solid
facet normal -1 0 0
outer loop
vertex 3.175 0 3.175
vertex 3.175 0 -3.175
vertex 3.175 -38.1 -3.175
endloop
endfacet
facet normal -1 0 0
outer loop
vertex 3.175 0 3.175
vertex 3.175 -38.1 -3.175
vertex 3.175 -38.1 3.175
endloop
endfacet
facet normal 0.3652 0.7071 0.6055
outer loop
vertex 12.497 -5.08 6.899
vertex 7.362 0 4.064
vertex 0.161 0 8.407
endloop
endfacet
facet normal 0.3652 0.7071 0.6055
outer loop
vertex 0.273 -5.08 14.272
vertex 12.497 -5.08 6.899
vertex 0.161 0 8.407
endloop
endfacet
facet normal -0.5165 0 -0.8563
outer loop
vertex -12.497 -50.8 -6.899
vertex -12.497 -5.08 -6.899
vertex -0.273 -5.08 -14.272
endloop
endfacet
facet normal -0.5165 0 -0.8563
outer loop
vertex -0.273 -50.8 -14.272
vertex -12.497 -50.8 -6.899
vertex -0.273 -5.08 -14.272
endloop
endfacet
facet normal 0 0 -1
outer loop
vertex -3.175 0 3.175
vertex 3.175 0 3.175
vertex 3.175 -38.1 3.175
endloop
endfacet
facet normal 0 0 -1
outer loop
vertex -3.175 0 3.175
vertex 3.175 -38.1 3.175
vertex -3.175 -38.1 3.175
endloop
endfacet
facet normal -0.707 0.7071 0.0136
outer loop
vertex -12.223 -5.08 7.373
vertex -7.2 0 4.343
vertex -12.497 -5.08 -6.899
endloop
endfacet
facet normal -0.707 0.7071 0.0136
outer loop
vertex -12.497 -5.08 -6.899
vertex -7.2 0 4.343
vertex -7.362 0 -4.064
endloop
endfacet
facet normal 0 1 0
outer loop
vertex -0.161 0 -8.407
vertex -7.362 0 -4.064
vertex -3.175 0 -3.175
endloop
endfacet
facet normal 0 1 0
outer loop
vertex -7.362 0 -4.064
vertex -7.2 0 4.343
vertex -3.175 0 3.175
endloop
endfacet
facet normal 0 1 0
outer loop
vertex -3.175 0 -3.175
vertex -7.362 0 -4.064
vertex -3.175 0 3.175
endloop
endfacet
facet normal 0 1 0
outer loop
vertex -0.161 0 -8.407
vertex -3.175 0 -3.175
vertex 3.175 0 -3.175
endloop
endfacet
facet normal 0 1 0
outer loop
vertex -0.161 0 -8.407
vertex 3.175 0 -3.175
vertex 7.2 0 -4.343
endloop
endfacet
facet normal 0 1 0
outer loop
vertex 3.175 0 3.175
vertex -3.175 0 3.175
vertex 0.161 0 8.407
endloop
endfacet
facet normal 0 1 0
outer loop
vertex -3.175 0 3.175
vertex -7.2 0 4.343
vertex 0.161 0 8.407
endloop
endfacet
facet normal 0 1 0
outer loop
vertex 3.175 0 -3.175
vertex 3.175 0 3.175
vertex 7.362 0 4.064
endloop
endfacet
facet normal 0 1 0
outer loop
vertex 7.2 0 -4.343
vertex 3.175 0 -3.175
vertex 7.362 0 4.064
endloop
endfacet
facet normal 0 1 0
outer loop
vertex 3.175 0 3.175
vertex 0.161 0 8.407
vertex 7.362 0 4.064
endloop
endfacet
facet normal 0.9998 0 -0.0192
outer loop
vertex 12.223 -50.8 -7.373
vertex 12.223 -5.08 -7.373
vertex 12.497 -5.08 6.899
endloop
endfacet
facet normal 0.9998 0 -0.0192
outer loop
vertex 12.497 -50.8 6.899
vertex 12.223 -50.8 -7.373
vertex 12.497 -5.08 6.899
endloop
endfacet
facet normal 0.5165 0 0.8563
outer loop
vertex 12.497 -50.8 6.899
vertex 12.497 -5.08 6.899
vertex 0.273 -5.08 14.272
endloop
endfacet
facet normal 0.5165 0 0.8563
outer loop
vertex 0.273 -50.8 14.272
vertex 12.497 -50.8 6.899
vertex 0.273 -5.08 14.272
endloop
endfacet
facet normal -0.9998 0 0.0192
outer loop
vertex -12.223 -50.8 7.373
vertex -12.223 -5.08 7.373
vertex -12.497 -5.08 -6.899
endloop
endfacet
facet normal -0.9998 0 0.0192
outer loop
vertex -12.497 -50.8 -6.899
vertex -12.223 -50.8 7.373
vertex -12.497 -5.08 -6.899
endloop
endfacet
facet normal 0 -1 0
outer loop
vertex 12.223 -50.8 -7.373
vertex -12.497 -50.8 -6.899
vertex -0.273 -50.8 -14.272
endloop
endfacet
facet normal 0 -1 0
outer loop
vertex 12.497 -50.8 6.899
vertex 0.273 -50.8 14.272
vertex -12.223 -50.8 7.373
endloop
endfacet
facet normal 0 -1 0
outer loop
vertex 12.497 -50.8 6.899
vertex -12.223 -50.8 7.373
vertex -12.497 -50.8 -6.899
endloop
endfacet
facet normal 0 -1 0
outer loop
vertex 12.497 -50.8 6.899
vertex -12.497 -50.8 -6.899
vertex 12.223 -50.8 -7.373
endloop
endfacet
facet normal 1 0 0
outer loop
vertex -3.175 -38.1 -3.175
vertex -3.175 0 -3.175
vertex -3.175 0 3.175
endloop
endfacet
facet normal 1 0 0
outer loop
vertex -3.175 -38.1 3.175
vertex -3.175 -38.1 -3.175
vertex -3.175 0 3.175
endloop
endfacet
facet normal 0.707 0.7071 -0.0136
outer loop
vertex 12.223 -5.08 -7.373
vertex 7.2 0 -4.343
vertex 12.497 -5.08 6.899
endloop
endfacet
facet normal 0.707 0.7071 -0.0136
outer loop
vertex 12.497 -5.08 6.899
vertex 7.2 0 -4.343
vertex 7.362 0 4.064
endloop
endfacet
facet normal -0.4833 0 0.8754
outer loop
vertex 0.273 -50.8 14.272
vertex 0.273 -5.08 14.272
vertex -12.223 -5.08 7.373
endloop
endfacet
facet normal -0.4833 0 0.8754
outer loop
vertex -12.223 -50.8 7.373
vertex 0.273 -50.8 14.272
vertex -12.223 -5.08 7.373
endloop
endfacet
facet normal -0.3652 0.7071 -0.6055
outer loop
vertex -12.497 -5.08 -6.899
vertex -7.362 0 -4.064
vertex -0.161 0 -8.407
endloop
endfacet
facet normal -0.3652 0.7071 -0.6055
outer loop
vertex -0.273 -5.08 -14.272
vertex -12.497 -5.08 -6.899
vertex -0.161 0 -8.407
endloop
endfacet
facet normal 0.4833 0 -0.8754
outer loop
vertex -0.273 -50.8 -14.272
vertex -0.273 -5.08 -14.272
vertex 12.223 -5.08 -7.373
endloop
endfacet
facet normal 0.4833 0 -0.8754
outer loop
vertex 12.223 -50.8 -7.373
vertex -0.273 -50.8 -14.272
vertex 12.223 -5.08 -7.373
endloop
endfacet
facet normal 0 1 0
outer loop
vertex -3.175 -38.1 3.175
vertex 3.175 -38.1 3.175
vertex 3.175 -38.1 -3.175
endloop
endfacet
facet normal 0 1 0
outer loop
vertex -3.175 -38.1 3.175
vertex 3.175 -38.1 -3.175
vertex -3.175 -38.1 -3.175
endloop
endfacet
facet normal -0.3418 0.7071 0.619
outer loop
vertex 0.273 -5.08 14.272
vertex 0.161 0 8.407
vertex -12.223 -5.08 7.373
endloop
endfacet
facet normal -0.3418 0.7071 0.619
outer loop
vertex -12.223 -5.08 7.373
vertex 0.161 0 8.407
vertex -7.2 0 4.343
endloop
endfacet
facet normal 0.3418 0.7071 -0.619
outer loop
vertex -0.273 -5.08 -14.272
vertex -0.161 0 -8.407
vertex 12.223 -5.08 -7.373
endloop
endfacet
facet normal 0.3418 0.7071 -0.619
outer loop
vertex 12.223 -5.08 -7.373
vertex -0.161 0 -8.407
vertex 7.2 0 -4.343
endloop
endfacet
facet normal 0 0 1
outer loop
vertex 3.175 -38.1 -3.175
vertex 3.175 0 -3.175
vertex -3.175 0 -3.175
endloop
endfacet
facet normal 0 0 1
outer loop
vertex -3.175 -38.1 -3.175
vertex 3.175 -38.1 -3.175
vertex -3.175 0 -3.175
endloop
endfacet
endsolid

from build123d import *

# Parameters (mm, degrees)
F1_DEPTH = 50.8
F2_SIZE  = 5.08
F3_W     = 6.35
F3_H     = 6.35
F4_DEPTH = 38.1


with BuildPart() as f1:
    # F0 (on Front) → F1 (new body)
    with BuildSketch(Plane.XZ):
        Polygon((12.496759, 6.899342), (0.273374, 14.272182), (-12.223385, 7.37284), (-12.496759, -6.899342), (-0.273374, -14.272182), (12.223385, -7.37284), align=None)
    extrude(amount=F1_DEPTH)

    # F2
    f2_edges = [f1.edges().sort_by_distance(p)[0] for p in [
        (6.385067, 0, 10.585762),
        (12.360072, 0, -0.236749),
        (5.975005, 0, -10.822511),
        (-6.385067, 0, -10.585762),
        (-12.360072, 0, 0.236749),
        (-5.975005, 0, 10.822511),
    ]]
    chamfer(f2_edges, length=F2_SIZE)

    # F3 (on face) → F4 (cut)
    with BuildSketch(Plane(origin=(0, 0, 0), x_dir=(-1, 0, 0), z_dir=(0, 1, 0))):
        Rectangle(F3_W, F3_H)
    extrude(amount=-F4_DEPTH, mode=Mode.SUBTRACT)


solid = f1.part
